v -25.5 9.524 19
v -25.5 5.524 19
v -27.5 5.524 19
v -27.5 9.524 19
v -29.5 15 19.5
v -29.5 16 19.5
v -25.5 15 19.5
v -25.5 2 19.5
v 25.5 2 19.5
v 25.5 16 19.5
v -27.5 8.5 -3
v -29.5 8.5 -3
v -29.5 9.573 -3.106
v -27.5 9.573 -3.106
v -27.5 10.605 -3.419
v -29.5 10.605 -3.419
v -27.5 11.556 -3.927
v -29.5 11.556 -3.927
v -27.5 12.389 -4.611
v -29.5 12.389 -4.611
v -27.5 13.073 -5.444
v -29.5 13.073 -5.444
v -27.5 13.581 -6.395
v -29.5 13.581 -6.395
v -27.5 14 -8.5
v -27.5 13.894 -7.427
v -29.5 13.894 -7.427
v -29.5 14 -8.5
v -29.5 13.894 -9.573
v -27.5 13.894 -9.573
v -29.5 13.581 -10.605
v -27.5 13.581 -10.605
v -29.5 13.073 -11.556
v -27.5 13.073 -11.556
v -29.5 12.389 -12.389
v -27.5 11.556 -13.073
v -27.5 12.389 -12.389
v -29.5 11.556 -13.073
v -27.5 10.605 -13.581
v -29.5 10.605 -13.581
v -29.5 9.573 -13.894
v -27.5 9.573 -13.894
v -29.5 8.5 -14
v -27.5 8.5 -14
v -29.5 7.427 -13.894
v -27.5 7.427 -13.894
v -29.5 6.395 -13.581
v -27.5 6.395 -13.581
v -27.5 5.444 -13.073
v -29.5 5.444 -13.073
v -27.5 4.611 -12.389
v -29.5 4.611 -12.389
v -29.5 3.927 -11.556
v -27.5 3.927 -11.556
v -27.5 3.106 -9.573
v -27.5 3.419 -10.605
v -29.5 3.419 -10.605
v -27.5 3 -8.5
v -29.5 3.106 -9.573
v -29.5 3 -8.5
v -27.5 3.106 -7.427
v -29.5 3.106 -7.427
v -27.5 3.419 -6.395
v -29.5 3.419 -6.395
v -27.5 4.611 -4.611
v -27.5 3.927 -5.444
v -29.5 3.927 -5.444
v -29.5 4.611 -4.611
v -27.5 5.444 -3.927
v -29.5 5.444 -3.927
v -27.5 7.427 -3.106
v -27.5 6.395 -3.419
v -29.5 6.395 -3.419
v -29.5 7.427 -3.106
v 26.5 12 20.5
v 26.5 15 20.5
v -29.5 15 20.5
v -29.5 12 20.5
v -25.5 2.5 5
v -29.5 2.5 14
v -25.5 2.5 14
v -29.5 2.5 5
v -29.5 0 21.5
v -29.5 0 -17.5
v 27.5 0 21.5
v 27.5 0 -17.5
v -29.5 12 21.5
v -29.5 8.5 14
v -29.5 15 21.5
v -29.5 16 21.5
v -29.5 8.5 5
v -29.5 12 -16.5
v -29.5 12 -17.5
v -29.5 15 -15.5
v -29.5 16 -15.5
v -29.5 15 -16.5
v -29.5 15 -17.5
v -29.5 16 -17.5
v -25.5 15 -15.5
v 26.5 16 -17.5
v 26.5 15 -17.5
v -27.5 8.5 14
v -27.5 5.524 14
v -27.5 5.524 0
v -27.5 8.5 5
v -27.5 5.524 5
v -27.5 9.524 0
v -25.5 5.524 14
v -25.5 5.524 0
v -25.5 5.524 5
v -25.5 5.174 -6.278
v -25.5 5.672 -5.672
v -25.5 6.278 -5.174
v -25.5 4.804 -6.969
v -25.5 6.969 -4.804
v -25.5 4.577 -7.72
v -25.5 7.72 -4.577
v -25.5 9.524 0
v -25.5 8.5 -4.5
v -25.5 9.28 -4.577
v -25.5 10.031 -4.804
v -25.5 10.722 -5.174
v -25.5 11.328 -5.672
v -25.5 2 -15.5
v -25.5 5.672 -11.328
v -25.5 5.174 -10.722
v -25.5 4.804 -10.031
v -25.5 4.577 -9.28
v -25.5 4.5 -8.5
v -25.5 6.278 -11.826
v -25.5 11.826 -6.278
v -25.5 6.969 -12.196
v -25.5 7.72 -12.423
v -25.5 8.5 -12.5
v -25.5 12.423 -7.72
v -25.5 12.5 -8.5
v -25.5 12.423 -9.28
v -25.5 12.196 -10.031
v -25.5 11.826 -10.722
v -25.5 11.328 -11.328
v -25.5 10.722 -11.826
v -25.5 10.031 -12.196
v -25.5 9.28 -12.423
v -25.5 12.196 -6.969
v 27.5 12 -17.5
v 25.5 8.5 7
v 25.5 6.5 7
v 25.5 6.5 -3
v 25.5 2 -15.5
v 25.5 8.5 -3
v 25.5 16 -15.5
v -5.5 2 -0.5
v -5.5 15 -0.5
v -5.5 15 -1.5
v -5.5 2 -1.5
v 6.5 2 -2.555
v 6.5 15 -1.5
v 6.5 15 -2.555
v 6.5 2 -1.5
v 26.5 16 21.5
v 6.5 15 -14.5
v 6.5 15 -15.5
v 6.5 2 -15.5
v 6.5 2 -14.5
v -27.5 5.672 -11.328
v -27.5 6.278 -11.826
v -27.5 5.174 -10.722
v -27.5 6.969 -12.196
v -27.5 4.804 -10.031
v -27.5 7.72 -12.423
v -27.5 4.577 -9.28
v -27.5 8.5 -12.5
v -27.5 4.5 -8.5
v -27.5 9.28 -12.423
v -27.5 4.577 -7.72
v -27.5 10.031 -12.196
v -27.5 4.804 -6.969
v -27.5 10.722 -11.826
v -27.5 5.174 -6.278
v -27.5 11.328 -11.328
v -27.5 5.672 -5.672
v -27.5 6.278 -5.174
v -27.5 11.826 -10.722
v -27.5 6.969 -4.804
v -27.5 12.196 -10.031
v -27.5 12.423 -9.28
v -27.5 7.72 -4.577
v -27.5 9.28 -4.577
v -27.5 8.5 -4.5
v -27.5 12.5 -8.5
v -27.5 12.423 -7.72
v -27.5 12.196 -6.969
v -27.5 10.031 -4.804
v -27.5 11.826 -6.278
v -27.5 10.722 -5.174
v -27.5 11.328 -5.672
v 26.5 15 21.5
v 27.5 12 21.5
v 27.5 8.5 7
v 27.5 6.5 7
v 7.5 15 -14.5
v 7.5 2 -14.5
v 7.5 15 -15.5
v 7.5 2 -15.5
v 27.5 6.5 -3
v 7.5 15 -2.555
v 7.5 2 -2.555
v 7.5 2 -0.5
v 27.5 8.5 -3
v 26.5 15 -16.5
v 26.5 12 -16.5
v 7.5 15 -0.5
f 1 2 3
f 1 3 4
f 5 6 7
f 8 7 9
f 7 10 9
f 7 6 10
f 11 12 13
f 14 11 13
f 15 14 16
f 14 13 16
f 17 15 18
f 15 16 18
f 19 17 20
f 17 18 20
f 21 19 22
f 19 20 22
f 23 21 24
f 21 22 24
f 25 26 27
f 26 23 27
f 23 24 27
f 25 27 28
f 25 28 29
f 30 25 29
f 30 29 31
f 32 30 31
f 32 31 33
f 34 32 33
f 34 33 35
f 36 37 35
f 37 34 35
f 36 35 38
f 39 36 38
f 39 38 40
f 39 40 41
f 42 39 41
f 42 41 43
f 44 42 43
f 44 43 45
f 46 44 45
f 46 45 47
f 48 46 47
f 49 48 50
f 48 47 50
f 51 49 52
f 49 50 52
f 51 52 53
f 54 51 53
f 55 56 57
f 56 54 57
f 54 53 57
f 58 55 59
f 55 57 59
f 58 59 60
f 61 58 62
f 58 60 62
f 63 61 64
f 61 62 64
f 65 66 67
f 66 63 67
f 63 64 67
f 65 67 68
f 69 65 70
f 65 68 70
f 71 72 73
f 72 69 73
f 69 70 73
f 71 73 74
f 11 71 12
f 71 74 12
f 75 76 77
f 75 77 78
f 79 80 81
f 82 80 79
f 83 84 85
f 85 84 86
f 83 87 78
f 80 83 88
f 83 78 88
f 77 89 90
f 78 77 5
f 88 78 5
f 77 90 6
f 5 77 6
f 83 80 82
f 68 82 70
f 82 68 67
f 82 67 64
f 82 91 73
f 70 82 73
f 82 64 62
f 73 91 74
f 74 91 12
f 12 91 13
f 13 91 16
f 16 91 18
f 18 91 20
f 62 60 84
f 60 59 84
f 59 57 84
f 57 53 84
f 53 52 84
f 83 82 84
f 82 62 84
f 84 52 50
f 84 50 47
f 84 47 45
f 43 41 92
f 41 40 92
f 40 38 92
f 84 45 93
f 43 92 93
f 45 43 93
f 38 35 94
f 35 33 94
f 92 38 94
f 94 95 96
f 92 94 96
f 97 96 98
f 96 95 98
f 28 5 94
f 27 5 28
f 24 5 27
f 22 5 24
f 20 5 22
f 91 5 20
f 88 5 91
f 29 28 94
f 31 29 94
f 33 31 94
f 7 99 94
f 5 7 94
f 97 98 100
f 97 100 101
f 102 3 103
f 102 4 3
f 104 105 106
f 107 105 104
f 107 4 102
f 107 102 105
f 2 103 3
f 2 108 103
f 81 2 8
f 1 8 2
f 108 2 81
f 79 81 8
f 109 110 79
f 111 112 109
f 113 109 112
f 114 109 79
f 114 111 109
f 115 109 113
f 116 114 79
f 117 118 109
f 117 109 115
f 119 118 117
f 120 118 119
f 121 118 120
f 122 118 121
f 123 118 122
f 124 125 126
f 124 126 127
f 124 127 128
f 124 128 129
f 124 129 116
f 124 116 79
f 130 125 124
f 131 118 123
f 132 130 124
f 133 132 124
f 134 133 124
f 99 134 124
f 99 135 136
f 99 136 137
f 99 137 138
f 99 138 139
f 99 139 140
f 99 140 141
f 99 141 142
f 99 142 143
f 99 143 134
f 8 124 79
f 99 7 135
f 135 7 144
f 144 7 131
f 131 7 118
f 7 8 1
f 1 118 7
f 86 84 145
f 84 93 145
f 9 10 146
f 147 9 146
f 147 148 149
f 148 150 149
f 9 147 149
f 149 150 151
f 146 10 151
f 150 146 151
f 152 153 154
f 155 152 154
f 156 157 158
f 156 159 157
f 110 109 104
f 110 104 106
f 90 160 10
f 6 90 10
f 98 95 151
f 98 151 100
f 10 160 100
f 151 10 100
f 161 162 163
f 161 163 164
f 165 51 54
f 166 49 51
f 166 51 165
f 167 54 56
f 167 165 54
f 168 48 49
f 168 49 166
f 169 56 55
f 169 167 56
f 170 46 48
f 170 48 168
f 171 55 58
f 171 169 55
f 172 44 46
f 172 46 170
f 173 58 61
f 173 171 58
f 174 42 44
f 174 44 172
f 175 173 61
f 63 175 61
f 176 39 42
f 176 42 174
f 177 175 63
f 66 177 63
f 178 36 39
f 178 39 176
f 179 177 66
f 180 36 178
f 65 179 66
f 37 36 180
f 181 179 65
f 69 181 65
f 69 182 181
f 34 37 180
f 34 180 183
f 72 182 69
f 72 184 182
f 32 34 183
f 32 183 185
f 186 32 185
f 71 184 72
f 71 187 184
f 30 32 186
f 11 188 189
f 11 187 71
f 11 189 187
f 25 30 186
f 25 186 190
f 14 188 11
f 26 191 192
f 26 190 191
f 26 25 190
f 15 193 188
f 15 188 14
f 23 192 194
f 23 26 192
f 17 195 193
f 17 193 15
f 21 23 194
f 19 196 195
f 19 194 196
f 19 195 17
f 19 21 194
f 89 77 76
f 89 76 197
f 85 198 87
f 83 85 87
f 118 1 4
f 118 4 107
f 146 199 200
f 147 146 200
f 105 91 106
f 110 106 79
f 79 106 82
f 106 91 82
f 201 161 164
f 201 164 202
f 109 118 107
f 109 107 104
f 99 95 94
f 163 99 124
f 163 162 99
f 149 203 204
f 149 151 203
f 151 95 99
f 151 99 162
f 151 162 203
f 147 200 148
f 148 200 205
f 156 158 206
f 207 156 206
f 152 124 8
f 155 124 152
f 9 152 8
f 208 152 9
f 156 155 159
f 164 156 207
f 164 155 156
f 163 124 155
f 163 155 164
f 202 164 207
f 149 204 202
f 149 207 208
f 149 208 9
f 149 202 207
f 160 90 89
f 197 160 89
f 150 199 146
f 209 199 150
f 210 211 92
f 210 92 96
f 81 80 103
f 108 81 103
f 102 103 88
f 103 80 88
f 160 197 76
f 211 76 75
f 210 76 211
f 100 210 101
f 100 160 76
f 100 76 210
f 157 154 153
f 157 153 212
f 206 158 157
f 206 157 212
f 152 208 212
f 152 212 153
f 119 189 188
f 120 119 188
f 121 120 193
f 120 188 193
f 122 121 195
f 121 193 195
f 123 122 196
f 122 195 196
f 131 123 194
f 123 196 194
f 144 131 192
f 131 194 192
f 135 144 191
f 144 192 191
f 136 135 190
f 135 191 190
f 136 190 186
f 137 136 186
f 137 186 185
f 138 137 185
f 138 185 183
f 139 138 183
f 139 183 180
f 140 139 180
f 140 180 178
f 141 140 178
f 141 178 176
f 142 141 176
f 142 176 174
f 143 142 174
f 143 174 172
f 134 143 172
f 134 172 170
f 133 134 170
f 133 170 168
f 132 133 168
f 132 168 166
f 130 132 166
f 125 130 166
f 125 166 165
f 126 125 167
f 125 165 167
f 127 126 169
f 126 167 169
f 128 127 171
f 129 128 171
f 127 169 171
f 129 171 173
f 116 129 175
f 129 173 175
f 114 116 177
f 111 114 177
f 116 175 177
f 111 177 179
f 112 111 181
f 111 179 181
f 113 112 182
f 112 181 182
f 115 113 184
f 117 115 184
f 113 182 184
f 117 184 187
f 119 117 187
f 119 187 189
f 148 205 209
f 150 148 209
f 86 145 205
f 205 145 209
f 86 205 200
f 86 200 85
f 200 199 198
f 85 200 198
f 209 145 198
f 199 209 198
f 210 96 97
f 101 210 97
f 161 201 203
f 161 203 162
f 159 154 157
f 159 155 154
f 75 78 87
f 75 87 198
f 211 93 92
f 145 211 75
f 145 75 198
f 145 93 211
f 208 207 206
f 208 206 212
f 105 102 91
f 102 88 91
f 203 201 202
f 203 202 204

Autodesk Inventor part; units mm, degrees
ref_plane "YZ Plane" through (0, 0, 0) normal (1, 0, 0) x (0, 1, 0)
ref_plane "XZ Plane" through (0, 0, 0) normal (0, 1, 0) x (-1, 0, 0)
ref_plane "XY Plane" through (0, 0, 0) normal (0, 0, 1) x (1, 0, 0)
sketch "Boceto1" plane through (0, 0, 0) normal (0, 1, 0) x (-1, 0, 0)
  line L0 (27.5, -17.5) -> (-27.5, -17.5)
  line L1 (-27.5, -17.5) -> (-27.5, 17.5)
  line L2 (-27.5, 17.5) -> (27.5, 17.5)
  line L3 (27.5, 17.5) -> (27.5, -17.5)
  line L4 (27.5, -17.5) -> (-27.5, 17.5) construction
  line L5 (-27.5, -17.5) -> (27.5, 17.5) construction
  point P0 (0, 0)
  dimension "d0" = 55
  dimension "d1" = 35
extrude "Extrusión1" add sketch "Boceto1" along normal blind 15
sketch "Boceto2" plane through (0, 15, 0) normal (0, 1, 0) x (1, 0, 0)
  line L0 (25.5, -15.5) -> (-25.5, -15.5)
  line L1 (-25.5, -15.5) -> (-25.5, 15.5)
  line L2 (-25.5, 15.5) -> (25.5, 15.5)
  line L3 (25.5, 15.5) -> (25.5, -15.5)
  line L4 (25.5, -15.5) -> (-25.5, 15.5) construction
  line L5 (-25.5, -15.5) -> (25.5, 15.5) construction
  point P0 (0, 0)
  dimension "d4" = 51
  dimension "d5" = 31
extrude "Extrusión2" cut sketch "Boceto2" against normal blind 13
sketch "Boceto3" plane through (-27.5, 0, -17.5) normal (-1, 0, 0) x (0, 0, 1)
  point P0 (17.5, 0)
sketch "Boceto4" plane through (0, 15, 0) normal (0, 1, 0) x (1, 0, 0)
  line L0 (-27.5, 17.5) -> (-27.5, -17.5) projected
  line L1 (-27.5, -17.5) -> (-29.5, -17.5)
  line L2 (-29.5, -17.5) -> (-29.5, 17.5)
  line L3 (-29.5, 17.5) -> (-27.5, 17.5)
  line L4 (-27.5, 17.5) -> (-27.5, -17.5)
  point P0 (0, 0)
  dimension "d8" = 2
extrude "Extrusión3" add sketch "Boceto4" against normal blind 15
sketch "Boceto5" plane through (-29.5, 15, -17.5) normal (-1, 0, 0) x (0, 0, 1)
  line L0 (35, 0) -> (0, 0) projected
  line L1 (0, 0) -> (9, 0)
  line L2 (9, 0) -> (9, -6.5)
  line L3 (2, -13) -> (33, -13) projected
  circle A0 centre (9, -6.5) radius 5.5
  point P0 (17.5, -15)
  dimension "d11" = 9
  dimension "d12" = 6.5
  dimension "d13" = 11
extrude "Extrusión4" cut sketch "Boceto5" against normal blind 2
sketch "Boceto6" plane through (-27.5, 8.5, -8.5) normal (-1, 0, 0) x (0, 0, 1)
  circle A0 centre (0, 0) radius 4
  point P0 (8.5, -8.5)
  dimension "d16" = 8
extrude "Extrusión5" cut sketch "Boceto6" against normal blind 2
sketch "Boceto7" plane through (0, 2, 0) normal (0, 1, 0) x (1, 0, 0)
  line L0 (-27.5, 3) -> (-27.5, 14) projected
  line L1 (-27.5, 3) -> (-27.5, 8.5)
  line L2 (-25.5, -15.5) -> (-25.5, 15.5) projected
  line L3 (-25.5, 8.5) -> (-25.5, 1.5)
  line L4 (-25.5, 15.5) -> (25.5, 15.5) projected
  line L5 (7.5, 15.5) -> (7.5, 14.5)
  line L6 (7.5, 14.5) -> (6.5, 14.5)
  line L7 (6.5, 14.5) -> (6.5, 15.5)
  line L8 (6.5, 1.5) -> (6.5, 2.5547)
  line L9 (6.5, 2.5547) -> (7.5, 2.5547)
  line L10 (7.5, 2.5547) -> (7.5, 0.5)
  line L11 (7.5, 0.5) -> (-5.5, 0.5)
  line L12 (-5.5, 0.5) -> (-5.5, 1.5)
  line L13 (-5.5, 1.5) -> (6.5, 1.5)
  point P0 (0, 0)
  dimension "d19" = 7
  dimension "d27" = 32
extrude "Extrusión6" add sketch "Boceto7" along normal blind 13 contours L8 L9 L10 L11 L12 L13
sketch "Boceto8" plane through (0, 2, 0) normal (0, 1, 0) x (1, 0, 0)
  line L0 (6.5, 1.5) -> (6.5, 2.5547) projected
  line L1 (-25.5, 15.5) -> (25.5, 15.5) projected
  line L2 (6.5, 15.5) -> (6.5, 14.5)
  line L3 (6.5, 14.5) -> (7.5, 14.5)
  line L4 (7.5, 14.5) -> (7.5, 15.5)
  point P0 (0, 0)
extrude "Extrusión7" add sketch "Boceto8" along normal blind 13
sketch "Boceto9" plane through (0, 15, 0) normal (0, 1, 0) x (1, 0, 0)
  line L0 (-29.5, -17.5) -> (27.5, -17.5) projected
  line L1 (27.5, -17.5) -> (27.5, -21.5)
  line L2 (27.5, -21.5) -> (-29.5, -21.5)
  line L3 (-29.5, -21.5) -> (-29.5, -17.5)
  point P0 (0, 0)
  dimension "d34" = 4
extrude "Extrusión8" add sketch "Boceto9" against normal blind 15
sketch "Boceto10" plane through (0, 15, 0) normal (0, 1, 0) x (1, 0, 0)
  line L0 (25.5, -15.5) -> (-25.5, -15.5) projected
  line L1 (-25.5, -15.5) -> (25.5, -15.5)
  line L2 (25.5, -15.5) -> (25.5, -19.5)
  line L3 (25.5, -19.5) -> (-25.5, -19.5)
  line L4 (-25.5, -19.5) -> (-25.5, -15.5)
  point P0 (0, 0)
  dimension "d37" = 4
extrude "Extrusión9" cut sketch "Boceto10" against normal blind 13
sketch "Boceto11" plane through (-29.5, 0, -17.5) normal (-1, 0, 0) x (0, 0, 1)
  line L0 (39, 15) -> (37, 15)
  line L1 (39, 15) -> (0, 15) projected
  line L2 (37, 15) -> (27, 15)
  line L3 (0, 0) -> (39, 0) projected
  line L4 (2, 2) -> (37, 2) projected
  line L5 (27, 5.5) -> (27, 8.5)
  line L6 (27, 5.5) -> (31, 5.5)
  line L7 (31, 5.5) -> (31, 2.5)
  line L8 (31, 2.5) -> (23, 2.5)
  line L9 (23, 2.5) -> (23, 5.5)
  line L10 (23, 5.5) -> (27, 5.5)
  point P0 (17.5, 0)
  dimension "d41" = 10
  dimension "d45" = 3
  dimension "d46" = 4
extrude "Extrusión10" cut sketch "Boceto11" against normal blind 4
sketch "Boceto12" plane through (-25.5, 2, -15.5) normal (1, 0, 0) x (0, 0, -1)
  line L0 (-29, 3.5) -> (-29, 0.5) projected
  line L1 (-29, 3.5) -> (-25, 3.5)
  line L2 (-29, 3.5) -> (-21, 3.5) projected
  line L3 (-25, 6.5) -> (-21, 6.5)
  line L4 (-21, 0.5) -> (-21, 3.5) projected
  line L5 (-21, 6.5) -> (-21, 3.5)
  line L6 (-21, 3.5) -> (-29, 3.5)
  line L7 (-29, 6.5) -> (-29, 3.2703)
  line L8 (-29, 6.5) -> (-25, 6.5)
  point P0 (-15.5, -2)
sketch "Boceto13" plane through (-25.5, 2, -15.5) normal (1, 0, 0) x (0, 0, -1)
  line L0 (-25, 3.524) -> (-34.5, 3.524)
  line L1 (-35, 13) -> (-35, 0) projected
  line L2 (-34.5, 3.524) -> (-34.5, 6.524)
  line L3 (-35, 13) -> (0, 13) projected
  line L4 (-34.5, 6.524) -> (-15.5, 6.524)
  line L5 (-15.5, 6.524) -> (-15.5, 3.524)
  line L6 (-35, 0) -> (0, 0) projected
  line L7 (-15.5, 3.524) -> (-25, 3.524)
  point P0 (-15.5, -2)
  dimension "d52" = 9.5
  dimension "d54" = 3
  dimension "d55" = 19
  dimension "d56" = 3
extrude "Extrusión11" cut sketch "Boceto13" against normal blind 2
sketch "Boceto14" plane through (27.5, 0, -17.5) normal (1, 0, 0) x (0, 0, -1)
  line L0 (0, 15) -> (0, 0) projected
  line L1 (0, 0) -> (-19.5, 0)
  line L2 (-39, 0) -> (0, 0) projected
  line L3 (-19.5, 0) -> (-19.5, 7.5)
  line L4 (-36.5, 8.524) -> (-17.5, 8.524) projected
  line L5 (-19.5, 7.5) -> (-24.5, 7.5)
  line L6 (-39, 15) -> (-39, 0) projected
  line L7 (-24.5, 7.5) -> (-24.5, 6.5)
  line L8 (-24.5, 6.5) -> (-14.5, 6.5)
  line L9 (-14.5, 6.5) -> (-14.5, 8.5)
  line L10 (-37, 15) -> (-2, 15) projected
  line L11 (-24.5, 6.5) -> (-24.5, 8.5)
  line L12 (-24.5, 8.5) -> (-14.5, 8.5)
  point P0 (-17.5, 0)
  dimension "d59" = 19.5
  dimension "d60" = 7.5
  dimension "d61" = 5
  dimension "d62" = 1
  dimension "d63" = 10
  dimension "d64" = 2
  dimension "d65" = 2
extrude "Extrusión12" cut sketch "Boceto14" against normal blind 3
sketch "Boceto15" plane through (0, 15, 0) normal (0, 1, 0) x (1, 0, 0)
  line L0 (27.5, -21.5) -> (-29.5, -21.5) projected
  line L1 (27.5, 17.5) -> (-29.5, 17.5) projected
  line L2 (-29.5, -21.5) -> (27.5, -21.5)
  line L3 (27.5, -21.5) -> (27.5, 17.5)
  line L4 (27.5, 17.5) -> (-29.5, 17.5)
  line L5 (27.5, -21.5) -> (27.5, 17.5) projected
  line L6 (27.5, 17.5) -> (27.5, 16.5)
  line L7 (26.5, 16.5) -> (-28.5, 16.5)
  line L8 (-28.5, -20.5) -> (26.5, -20.5)
  line L9 (26.5, -20.5) -> (26.5, 16.5)
  line L10 (-28.5, 16.5) -> (-29.5, 16.5)
  line L11 (-29.5, 17.5) -> (-29.5, -21.5) projected
  line L12 (27.5, 17.5) -> (-29.5, 17.5) projected
  line L13 (-29.5, 16.5) -> (-29.5, 17.5)
  line L14 (-28.5, -20.5) -> (-29.5, -20.5)
  line L15 (-29.5, -21.5) -> (-29.5, -20.5)
  point P0 (0, 0)
  dimension "d69" = 1
  dimension "d70" = 55
  dimension "d71" = 37
sketch "Boceto16" plane through (0, 15, 0) normal (0, 1, 0) x (1, 0, 0)
  point P0 (0, 0)
extrude "Extrusión13" cut sketch "Boceto15" against normal blind 3 contours L0 L11 L14 L8 L9 L7 L10 L1 L3
sketch "Boceto17" plane through (-29.5, 15, 20.5) normal (0, 0, 1) x (1, 0, 0)
  line L0 (0, 0) -> (56, 0) projected
  line L1 (56, 0) -> (56, -3) projected
  line L2 (0, 0) -> (56, 0)
  line L3 (56, 0) -> (56, -1.5)
  line L4 (56, -1.5) -> (0, -1.5)
  line L5 (0, -1.5) -> (0, 0)
  point P0 (29.5, -15)
extrude "Extrusión14" add sketch "Boceto17" along normal blind 1
sketch "Boceto18" plane through (26.5, 15, -16.5) normal (0, 0, -1) x (-1, 0, 0)
  line L0 (0, 0) -> (56, 0) projected
  line L1 (0, -1.5) -> (56, -1.5) projected
  line L2 (0, 0) -> (56, 0)
  line L3 (56, 0) -> (56, -1.5)
  line L4 (56, -1.5) -> (0, -1.5)
  line L5 (0, -1.5) -> (0, 0)
  point P0 (26.5, -15)
extrude "Extrusión15" add sketch "Boceto18" along normal blind 1
sketch "Boceto19" plane through (-29.5, 0, -17.5) normal (-1, 0, 0) x (0, 0, 1)
  line L0 (23, 2.5) -> (23, 5.5) projected
  line L1 (23, 5.5) -> (31, 5.5)
  line L2 (31, 5.5) -> (31, 8.5)
  line L3 (31, 8.5) -> (23, 8.5)
  line L4 (23, 8.5) -> (23, 5.5)
  point P0 (17.5, 0)
  dimension "d78" = 8
  dimension "d79" = 3
extrude "Extrusión16" cut sketch "Boceto19" against normal blind 6
sketch "Boceto20" plane through (-29.5, 0, -17.5) normal (-1, 0, 0) x (0, 0, 1)
  line L0 (23, 8.5) -> (23, 5.524) projected
  line L1 (23, 8.5) -> (22.5, 8.5)
  line L2 (24.5, 8.5) -> (14.5, 8.5) projected
  line L3 (22.5, 8.5) -> (22.5, 2.5)
  line L4 (22.5, 2.5) -> (31.5, 2.5)
  line L5 (23, 2.5) -> (31, 2.5) projected
  line L6 (31.5, 2.5) -> (31.5, 8.5)
  line L7 (31.5, 8.5) -> (22.5, 8.5)
  point P0 (17.5, 0)
  dimension "d82" = 0.5
  dimension "d83" = 6
  dimension "d84" = 9
  dimension "d85" = 6
extrude "Extrusión17" cut sketch "Boceto20" against normal blind 6
sketch "Boceto21" plane through (-25.5, 2, -15.5) normal (1, 0, 0) x (0, 0, -1)
  line L0 (-34.5, 6.524) -> (-15.5, 6.524) projected
  line L1 (-34.5, 6.524) -> (-34.5, 7.524)
  line L2 (-34.5, 7.524) -> (-15.5, 7.524)
  line L3 (-15.5, 7.524) -> (-15.5, 6.524)
  line L4 (-15.5, 6.524) -> (-34.5, 6.524)
  point P0 (-15.5, -2)
  dimension "d88" = 1
extrude "Extrusión18" cut sketch "Boceto21" against normal blind 2
sketch "Boceto22" plane through (26.5, 12, 20.5) normal (1, 0, 0) x (0, 0, -1)
  line L0 (0, 0) -> (37, 0) projected
  line L1 (37, 0) -> (37, 3)
  line L2 (-1, 3) -> (38, 3) projected
  line L3 (37, 3) -> (38, 3)
  line L4 (37, 0) -> (38, 0) projected
  line L5 (38, 3) -> (38, 0)
  line L6 (38, 0) -> (37, 0)
  line L7 (0, 1.5) -> (0, 0) projected
  line L8 (-1, 0) -> (-1, -12) projected
  line L9 (0, 0) -> (-1, 0)
  line L10 (-1, 0) -> (-1, 3)
  line L11 (0, 3) -> (0, 0)
  point P0 (20.5, -12)
extrude "Extrusión19" cut sketch "Boceto22" against normal blind 100 contours L9 L10 L2 L11 L7 | L1 L2 L5 L4
sketch "Boceto23" plane through (26.5, 15, 20.5) normal (1, 0, 0) x (0, 0, -1)
  line L0 (37, 0) -> (37, -3) projected
  line L1 (37, 0) -> (38, 0)
  line L2 (38, 0) -> (38.5, 0)
  line L3 (38.5, 0) -> (38.5, 1)
  line L4 (38.5, 1) -> (37, 1)
  line L5 (37, 1) -> (36, 1)
  line L6 (36, 1) -> (36, 0)
  line L7 (37, 0) -> (36, 0)
  line L8 (0, 0) -> (37, 0) projected
  point P0 (20.5, -15)
  dimension "d93" = 1
  dimension "d94" = 0.5
  dimension "d95" = 1
extrude "Extrusión20" add sketch "Boceto23" against normal blind 56
sketch "Boceto24" plane through (26.5, 15, 20.5) normal (1, 0, 0) x (0, 0, -1)
  line L0 (36, 0) -> (0, 0) projected
  line L1 (0, 0) -> (-1.5, 0)
  line L2 (-1.5, 0) -> (-1.5, 1)
  line L3 (-1.5, 1) -> (0.5, 1)
  line L4 (0.5, 1) -> (1, 1)
  line L5 (1, 0) -> (36, 0) projected
  line L6 (1, 1) -> (1, 0)
  line L7 (1, 0) -> (0, 0)
  point P0 (20.5, -15)
  dimension "d98" = 1.5
  dimension "d99" = 1
  dimension "d100" = 2
  dimension "d101" = 0.5
extrude "Extrusión21" add sketch "Boceto24" against normal blind 56
sketch "Boceto25" plane through (26.5, 15, 19.5) normal (1, 0, 0) x (0, 0, -1)
  line L0 (-2.5, 1) -> (0, 1) projected
  line L1 (-1, 0) -> (-2.5, 0) projected
  line L2 (-2.5, 1) -> (-2, 1)
  line L3 (-2, 1) -> (-2, 0)
  line L4 (-2, 0) -> (-2.5, 0)
  line L5 (-2.5, 0) -> (-2.5, 1)
  line L6 (37.5, 1) -> (35, 1) projected
  line L7 (36, 0) -> (37.5, 0) projected
  line L8 (37.5, 1) -> (37, 1)
  line L9 (37, 1) -> (37, 0)
  line L10 (37, 0) -> (37.5, 0)
  line L11 (37.5, 0) -> (37.5, 1)
  point P0 (19.5, -15)
  point P1 (-2, 1)
  dimension "d104" = 0.5
  dimension "d105" = 0.5
extrude "Extrusión22" cut sketch "Boceto25" against normal blind 56
sketch "Boceto26" plane through (26.5, 15, 19.5) normal (1, 0, 0) x (0, 0, -1)
  point P0 (19.5, -15)
sketch "Boceto27" plane through (26.5, 15, 19.5) normal (1, 0, 0) x (0, 0, -1)
  line L0 (35, 0) -> (0, 0) projected
  line L1 (0, 1) -> (0, 0) projected
  line L2 (35, 0) -> (0, 0)
  line L3 (0, 0) -> (0, 1)
  line L4 (0, 1) -> (35, 1)
  line L5 (35, 1) -> (35, 0)
  point P0 (19.5, -15)
extrude "Extrusión23" add sketch "Boceto27" against normal blind 1
properties part number "CajaArduinoNano"
